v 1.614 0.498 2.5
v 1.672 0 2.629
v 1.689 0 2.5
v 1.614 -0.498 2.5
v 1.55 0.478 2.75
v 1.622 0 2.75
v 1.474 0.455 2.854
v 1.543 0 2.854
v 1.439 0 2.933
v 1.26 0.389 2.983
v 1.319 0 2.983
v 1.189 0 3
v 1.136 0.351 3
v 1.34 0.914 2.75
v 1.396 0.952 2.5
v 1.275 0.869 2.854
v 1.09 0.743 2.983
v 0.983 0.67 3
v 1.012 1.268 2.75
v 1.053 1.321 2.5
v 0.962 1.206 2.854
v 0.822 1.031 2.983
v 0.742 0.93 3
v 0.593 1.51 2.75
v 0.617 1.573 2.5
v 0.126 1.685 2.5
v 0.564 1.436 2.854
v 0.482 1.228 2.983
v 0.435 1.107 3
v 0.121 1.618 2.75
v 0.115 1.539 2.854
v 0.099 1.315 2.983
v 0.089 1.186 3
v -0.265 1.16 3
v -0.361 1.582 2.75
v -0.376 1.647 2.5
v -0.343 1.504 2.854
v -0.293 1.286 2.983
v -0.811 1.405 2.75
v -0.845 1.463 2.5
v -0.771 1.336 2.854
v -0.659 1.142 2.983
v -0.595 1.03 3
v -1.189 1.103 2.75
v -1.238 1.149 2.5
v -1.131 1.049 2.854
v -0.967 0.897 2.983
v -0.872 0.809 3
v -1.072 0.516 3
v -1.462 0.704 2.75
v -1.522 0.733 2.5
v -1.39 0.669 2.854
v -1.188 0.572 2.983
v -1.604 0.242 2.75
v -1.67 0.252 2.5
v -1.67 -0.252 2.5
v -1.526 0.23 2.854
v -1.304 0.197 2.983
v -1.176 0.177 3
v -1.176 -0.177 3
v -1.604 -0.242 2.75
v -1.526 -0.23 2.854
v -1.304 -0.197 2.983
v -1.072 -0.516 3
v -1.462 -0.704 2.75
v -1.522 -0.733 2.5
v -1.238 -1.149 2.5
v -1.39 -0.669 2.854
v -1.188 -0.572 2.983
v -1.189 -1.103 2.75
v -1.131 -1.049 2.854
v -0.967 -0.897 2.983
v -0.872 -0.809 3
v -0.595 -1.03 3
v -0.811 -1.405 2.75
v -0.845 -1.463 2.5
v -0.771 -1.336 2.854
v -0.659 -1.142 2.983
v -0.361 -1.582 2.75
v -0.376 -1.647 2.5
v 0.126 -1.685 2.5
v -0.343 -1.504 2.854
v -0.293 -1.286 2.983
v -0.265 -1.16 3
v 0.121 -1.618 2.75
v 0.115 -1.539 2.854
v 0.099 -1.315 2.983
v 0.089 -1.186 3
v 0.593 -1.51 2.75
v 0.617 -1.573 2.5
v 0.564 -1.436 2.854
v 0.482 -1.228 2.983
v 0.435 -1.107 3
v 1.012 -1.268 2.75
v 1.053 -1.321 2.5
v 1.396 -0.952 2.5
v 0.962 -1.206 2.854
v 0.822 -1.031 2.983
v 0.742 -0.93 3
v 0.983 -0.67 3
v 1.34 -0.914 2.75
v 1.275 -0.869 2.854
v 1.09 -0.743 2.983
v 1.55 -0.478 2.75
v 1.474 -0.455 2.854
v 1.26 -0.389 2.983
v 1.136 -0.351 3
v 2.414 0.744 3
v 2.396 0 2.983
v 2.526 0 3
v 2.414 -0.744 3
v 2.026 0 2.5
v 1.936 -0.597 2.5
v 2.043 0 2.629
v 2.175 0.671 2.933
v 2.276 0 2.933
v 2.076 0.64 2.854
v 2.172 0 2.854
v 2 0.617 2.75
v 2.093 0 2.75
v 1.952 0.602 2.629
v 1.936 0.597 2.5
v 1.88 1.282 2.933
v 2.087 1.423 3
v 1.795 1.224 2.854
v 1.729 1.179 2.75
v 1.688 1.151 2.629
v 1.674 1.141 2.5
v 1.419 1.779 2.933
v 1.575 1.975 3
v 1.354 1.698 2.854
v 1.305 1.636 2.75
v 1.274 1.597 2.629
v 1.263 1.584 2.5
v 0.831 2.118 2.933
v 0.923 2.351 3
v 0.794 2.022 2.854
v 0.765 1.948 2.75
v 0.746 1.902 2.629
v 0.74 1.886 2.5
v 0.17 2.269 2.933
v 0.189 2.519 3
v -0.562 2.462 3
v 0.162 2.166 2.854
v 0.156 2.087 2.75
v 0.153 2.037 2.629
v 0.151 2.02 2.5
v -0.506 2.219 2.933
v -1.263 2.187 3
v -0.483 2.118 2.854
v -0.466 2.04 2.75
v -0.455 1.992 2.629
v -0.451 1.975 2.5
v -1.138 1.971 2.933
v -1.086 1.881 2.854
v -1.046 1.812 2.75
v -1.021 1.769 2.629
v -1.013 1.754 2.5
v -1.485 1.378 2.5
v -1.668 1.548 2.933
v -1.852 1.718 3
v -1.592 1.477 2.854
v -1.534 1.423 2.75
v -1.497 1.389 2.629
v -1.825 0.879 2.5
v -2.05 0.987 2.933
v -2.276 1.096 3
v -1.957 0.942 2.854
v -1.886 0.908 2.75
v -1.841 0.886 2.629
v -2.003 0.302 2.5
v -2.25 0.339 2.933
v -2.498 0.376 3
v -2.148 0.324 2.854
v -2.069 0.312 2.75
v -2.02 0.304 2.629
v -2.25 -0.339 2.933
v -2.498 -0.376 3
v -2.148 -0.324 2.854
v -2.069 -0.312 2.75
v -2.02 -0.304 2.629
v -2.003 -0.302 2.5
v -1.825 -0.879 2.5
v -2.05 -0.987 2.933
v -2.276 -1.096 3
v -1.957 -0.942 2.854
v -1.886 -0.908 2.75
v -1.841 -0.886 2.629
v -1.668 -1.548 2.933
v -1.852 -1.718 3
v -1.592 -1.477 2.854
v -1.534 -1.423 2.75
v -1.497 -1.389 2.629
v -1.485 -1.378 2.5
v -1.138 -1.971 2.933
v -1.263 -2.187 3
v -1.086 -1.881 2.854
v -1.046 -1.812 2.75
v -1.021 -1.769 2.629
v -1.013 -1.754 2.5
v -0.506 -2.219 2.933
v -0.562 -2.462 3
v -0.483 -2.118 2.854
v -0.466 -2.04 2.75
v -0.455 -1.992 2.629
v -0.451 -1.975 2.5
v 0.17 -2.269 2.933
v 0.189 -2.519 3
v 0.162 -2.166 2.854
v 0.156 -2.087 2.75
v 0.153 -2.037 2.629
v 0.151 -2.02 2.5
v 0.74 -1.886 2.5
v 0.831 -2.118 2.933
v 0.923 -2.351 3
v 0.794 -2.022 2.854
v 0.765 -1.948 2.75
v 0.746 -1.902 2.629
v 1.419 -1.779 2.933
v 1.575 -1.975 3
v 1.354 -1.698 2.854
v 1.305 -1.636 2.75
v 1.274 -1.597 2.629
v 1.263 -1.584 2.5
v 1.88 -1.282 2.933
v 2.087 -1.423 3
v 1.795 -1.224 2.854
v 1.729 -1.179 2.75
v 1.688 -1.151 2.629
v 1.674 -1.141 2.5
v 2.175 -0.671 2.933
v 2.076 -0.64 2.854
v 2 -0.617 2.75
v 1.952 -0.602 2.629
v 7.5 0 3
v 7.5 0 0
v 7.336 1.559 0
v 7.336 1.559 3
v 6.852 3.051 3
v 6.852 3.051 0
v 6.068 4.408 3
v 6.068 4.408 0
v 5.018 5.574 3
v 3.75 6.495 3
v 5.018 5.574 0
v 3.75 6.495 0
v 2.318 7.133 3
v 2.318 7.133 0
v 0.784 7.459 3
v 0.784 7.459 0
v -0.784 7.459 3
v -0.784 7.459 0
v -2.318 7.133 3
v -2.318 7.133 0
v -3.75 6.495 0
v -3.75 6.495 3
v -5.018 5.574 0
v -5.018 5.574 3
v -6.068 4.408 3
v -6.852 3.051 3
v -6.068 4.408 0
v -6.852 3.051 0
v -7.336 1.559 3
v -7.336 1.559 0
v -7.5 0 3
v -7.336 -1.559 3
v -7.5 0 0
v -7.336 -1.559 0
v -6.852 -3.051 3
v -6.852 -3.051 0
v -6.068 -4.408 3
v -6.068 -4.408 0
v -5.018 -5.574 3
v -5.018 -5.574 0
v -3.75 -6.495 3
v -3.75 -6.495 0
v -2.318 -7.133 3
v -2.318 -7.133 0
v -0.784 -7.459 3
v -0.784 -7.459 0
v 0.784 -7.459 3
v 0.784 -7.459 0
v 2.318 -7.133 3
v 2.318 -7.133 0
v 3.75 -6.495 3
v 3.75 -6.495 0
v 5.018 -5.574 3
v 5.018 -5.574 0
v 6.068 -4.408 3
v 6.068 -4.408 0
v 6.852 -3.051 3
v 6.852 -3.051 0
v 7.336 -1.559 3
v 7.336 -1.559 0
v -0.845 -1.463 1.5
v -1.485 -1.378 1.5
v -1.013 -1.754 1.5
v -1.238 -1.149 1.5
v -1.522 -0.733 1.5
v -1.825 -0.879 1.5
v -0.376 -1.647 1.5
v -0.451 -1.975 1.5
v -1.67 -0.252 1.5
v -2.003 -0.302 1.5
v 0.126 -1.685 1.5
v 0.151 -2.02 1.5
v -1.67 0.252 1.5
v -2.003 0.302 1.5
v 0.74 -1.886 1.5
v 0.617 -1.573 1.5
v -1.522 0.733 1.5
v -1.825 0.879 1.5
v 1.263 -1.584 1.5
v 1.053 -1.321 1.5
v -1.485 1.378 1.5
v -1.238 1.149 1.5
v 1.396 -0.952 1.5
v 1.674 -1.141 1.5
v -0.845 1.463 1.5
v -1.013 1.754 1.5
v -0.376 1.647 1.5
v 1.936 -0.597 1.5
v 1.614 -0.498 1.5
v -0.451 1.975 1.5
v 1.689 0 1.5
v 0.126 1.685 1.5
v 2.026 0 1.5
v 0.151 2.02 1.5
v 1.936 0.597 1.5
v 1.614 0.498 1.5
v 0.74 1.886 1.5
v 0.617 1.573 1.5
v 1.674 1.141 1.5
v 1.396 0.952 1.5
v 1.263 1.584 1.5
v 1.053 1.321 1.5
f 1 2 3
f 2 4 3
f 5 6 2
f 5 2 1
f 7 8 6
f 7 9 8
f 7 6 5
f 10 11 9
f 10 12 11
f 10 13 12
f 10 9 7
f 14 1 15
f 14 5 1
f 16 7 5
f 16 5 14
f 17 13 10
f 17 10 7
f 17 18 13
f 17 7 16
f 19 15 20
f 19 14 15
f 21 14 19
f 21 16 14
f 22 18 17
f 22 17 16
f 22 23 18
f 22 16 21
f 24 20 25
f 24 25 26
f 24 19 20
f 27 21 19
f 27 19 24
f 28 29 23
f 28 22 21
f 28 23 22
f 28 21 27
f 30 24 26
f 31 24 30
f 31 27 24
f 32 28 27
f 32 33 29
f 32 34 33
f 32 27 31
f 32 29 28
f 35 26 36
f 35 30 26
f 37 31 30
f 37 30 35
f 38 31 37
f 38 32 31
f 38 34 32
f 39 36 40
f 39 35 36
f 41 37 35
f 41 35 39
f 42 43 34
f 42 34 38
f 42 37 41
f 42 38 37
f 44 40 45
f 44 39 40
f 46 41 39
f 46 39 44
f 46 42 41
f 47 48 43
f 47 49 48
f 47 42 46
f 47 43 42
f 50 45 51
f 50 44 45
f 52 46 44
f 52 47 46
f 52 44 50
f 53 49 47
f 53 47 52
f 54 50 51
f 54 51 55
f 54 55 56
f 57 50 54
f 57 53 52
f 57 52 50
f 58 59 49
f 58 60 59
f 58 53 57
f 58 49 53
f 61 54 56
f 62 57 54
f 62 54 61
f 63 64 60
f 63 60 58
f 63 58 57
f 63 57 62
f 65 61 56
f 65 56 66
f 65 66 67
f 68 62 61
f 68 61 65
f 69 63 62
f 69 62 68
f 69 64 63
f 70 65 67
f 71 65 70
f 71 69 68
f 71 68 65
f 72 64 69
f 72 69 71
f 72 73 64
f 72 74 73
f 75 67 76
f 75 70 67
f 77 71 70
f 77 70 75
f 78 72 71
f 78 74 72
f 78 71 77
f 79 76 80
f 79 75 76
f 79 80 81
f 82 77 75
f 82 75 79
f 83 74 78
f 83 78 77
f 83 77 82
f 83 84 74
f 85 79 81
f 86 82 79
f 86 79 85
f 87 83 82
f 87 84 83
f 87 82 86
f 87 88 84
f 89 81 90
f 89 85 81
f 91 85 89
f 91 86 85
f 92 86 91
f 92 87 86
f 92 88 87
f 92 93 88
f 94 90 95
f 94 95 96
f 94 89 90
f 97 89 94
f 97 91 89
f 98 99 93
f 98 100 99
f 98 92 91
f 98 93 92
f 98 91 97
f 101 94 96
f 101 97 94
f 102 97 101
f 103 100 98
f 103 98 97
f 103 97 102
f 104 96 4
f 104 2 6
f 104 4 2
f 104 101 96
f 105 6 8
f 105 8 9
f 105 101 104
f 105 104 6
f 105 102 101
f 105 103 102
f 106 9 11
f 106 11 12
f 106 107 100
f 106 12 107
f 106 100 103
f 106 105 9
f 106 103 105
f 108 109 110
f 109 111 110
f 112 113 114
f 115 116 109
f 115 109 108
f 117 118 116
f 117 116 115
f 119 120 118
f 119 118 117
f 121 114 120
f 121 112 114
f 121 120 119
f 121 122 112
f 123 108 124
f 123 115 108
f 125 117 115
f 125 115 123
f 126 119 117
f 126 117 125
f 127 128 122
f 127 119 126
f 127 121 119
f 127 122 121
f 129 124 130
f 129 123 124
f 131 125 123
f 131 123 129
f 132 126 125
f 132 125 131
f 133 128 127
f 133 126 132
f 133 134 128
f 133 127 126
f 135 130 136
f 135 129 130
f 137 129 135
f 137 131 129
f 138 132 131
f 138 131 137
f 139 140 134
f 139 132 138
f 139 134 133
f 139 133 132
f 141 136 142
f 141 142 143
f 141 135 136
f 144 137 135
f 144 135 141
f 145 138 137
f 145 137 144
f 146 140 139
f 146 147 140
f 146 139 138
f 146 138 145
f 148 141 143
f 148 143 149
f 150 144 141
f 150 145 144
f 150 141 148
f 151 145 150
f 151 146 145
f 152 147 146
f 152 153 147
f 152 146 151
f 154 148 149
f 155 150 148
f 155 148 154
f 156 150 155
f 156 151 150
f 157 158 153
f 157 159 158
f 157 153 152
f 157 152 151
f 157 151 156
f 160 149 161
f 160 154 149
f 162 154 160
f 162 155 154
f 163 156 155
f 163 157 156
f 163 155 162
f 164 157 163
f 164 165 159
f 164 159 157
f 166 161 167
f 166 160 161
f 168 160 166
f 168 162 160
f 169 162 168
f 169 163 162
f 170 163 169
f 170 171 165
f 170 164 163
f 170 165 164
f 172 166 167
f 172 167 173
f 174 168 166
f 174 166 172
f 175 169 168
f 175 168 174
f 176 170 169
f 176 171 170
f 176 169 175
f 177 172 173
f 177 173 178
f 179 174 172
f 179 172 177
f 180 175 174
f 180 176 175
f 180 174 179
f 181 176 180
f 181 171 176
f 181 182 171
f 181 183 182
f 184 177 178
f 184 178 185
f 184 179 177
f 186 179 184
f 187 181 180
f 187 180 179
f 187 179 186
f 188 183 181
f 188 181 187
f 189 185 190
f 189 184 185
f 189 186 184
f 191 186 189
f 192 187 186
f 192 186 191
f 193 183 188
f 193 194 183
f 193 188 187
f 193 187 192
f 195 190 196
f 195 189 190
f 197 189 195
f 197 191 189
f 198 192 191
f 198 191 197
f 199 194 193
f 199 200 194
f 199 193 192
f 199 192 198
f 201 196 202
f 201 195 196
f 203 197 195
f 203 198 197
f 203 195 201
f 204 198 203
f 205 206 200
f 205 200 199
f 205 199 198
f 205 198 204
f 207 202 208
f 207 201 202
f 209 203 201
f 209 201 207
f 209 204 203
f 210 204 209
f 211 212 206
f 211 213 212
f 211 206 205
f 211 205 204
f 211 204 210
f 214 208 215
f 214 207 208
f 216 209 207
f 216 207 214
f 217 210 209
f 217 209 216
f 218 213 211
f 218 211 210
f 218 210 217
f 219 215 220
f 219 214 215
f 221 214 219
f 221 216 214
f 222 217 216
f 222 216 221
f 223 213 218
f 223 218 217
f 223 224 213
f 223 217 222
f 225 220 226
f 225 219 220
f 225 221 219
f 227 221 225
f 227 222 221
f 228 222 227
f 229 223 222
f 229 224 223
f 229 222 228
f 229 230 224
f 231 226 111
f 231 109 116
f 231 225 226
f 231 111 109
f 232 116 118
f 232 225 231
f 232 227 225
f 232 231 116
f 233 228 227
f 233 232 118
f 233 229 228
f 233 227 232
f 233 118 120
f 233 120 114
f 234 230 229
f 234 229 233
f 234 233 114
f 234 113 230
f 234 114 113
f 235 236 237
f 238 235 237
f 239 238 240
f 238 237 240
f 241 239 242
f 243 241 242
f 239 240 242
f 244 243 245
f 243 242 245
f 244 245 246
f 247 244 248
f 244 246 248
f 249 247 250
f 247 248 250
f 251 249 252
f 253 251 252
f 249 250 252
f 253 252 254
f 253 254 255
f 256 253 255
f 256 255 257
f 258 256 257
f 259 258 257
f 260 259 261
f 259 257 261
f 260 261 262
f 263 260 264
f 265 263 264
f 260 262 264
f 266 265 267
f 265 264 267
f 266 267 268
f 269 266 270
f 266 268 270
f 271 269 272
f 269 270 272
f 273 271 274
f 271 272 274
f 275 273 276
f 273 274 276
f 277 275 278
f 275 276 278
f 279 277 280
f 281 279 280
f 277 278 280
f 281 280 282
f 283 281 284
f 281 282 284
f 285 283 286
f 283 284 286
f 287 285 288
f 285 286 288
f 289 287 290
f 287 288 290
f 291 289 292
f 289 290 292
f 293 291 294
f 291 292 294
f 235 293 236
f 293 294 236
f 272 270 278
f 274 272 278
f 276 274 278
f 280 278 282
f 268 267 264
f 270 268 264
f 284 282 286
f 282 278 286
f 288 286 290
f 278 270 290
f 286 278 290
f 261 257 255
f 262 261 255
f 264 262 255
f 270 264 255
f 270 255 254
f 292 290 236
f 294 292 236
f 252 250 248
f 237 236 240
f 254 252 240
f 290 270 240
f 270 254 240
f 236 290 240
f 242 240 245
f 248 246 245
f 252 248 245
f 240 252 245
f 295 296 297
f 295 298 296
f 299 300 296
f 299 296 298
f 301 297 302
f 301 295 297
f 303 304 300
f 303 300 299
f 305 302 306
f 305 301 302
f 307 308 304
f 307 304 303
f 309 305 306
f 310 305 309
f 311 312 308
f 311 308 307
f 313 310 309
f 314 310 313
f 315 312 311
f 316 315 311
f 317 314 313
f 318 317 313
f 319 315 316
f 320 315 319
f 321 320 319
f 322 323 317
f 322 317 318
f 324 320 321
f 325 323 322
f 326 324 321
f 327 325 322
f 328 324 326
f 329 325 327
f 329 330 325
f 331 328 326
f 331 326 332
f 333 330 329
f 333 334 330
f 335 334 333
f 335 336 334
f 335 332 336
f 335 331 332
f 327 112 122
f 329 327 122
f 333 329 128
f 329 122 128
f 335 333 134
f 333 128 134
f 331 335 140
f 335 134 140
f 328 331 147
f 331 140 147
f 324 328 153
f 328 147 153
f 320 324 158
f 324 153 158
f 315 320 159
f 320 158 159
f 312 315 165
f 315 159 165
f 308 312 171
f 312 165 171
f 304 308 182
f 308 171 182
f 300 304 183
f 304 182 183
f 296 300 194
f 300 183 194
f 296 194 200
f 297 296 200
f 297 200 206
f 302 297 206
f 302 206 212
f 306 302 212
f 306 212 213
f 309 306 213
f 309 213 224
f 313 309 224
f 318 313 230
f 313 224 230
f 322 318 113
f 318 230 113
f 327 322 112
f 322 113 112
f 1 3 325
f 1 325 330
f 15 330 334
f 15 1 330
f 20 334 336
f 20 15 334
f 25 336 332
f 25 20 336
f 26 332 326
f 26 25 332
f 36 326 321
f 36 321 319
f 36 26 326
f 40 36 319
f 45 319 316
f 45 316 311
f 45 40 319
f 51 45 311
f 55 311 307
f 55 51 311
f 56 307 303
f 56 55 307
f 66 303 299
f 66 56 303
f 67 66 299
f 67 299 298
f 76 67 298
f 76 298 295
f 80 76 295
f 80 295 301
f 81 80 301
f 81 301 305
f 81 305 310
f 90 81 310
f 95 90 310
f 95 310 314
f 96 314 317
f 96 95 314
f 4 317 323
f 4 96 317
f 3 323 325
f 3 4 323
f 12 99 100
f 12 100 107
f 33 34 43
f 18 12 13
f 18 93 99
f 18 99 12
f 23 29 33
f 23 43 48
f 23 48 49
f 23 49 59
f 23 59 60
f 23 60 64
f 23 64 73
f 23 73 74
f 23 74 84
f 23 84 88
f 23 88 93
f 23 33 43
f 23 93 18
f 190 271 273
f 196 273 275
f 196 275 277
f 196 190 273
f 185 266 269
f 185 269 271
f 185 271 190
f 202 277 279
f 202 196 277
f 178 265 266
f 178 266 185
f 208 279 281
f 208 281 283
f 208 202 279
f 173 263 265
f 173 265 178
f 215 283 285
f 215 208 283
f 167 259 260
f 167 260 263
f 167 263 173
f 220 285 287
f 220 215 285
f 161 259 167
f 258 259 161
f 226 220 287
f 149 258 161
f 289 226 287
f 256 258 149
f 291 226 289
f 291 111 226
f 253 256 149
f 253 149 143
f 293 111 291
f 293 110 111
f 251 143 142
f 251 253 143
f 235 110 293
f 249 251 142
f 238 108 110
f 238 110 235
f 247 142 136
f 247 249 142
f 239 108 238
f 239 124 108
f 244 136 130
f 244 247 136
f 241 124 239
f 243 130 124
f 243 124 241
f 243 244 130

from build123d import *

# Parameters (mm, degrees)
F0_R     = 7.5
F0_R_2   = 2.0257797654
F0_R_3   = 1.6893187084
F1_DEPTH = 3
F2_R     = 2.0257797654
F2_R_2   = 1.6893187084
F3_DEPTH = 1.5
F4_R     = 0.5


with BuildPart() as f1:
    # F0 (on Top) → F1 (new body)
    with BuildSketch(Plane.XY):
        Circle(F0_R)
        Circle(F0_R_2, mode=Mode.SUBTRACT)
        Circle(F0_R_2)
        Circle(F0_R_3, mode=Mode.SUBTRACT)
        Circle(F0_R_3)
    extrude(amount=F1_DEPTH)

    # F2 (on face) → F3 (cut)
    with BuildSketch(Plane.XY.offset(3)):
        Circle(F2_R)
        Circle(F2_R_2, mode=Mode.SUBTRACT)
    extrude(amount=-F3_DEPTH, mode=Mode.SUBTRACT)

    # F4
    f4_edges = [f1.edges().sort_by_distance(p)[0] for p in [
        (-1.689319, 0, 3),
        (-2.02578, 0, 3),
    ]]
    fillet(f4_edges, radius=F4_R)


solid = f1.part
